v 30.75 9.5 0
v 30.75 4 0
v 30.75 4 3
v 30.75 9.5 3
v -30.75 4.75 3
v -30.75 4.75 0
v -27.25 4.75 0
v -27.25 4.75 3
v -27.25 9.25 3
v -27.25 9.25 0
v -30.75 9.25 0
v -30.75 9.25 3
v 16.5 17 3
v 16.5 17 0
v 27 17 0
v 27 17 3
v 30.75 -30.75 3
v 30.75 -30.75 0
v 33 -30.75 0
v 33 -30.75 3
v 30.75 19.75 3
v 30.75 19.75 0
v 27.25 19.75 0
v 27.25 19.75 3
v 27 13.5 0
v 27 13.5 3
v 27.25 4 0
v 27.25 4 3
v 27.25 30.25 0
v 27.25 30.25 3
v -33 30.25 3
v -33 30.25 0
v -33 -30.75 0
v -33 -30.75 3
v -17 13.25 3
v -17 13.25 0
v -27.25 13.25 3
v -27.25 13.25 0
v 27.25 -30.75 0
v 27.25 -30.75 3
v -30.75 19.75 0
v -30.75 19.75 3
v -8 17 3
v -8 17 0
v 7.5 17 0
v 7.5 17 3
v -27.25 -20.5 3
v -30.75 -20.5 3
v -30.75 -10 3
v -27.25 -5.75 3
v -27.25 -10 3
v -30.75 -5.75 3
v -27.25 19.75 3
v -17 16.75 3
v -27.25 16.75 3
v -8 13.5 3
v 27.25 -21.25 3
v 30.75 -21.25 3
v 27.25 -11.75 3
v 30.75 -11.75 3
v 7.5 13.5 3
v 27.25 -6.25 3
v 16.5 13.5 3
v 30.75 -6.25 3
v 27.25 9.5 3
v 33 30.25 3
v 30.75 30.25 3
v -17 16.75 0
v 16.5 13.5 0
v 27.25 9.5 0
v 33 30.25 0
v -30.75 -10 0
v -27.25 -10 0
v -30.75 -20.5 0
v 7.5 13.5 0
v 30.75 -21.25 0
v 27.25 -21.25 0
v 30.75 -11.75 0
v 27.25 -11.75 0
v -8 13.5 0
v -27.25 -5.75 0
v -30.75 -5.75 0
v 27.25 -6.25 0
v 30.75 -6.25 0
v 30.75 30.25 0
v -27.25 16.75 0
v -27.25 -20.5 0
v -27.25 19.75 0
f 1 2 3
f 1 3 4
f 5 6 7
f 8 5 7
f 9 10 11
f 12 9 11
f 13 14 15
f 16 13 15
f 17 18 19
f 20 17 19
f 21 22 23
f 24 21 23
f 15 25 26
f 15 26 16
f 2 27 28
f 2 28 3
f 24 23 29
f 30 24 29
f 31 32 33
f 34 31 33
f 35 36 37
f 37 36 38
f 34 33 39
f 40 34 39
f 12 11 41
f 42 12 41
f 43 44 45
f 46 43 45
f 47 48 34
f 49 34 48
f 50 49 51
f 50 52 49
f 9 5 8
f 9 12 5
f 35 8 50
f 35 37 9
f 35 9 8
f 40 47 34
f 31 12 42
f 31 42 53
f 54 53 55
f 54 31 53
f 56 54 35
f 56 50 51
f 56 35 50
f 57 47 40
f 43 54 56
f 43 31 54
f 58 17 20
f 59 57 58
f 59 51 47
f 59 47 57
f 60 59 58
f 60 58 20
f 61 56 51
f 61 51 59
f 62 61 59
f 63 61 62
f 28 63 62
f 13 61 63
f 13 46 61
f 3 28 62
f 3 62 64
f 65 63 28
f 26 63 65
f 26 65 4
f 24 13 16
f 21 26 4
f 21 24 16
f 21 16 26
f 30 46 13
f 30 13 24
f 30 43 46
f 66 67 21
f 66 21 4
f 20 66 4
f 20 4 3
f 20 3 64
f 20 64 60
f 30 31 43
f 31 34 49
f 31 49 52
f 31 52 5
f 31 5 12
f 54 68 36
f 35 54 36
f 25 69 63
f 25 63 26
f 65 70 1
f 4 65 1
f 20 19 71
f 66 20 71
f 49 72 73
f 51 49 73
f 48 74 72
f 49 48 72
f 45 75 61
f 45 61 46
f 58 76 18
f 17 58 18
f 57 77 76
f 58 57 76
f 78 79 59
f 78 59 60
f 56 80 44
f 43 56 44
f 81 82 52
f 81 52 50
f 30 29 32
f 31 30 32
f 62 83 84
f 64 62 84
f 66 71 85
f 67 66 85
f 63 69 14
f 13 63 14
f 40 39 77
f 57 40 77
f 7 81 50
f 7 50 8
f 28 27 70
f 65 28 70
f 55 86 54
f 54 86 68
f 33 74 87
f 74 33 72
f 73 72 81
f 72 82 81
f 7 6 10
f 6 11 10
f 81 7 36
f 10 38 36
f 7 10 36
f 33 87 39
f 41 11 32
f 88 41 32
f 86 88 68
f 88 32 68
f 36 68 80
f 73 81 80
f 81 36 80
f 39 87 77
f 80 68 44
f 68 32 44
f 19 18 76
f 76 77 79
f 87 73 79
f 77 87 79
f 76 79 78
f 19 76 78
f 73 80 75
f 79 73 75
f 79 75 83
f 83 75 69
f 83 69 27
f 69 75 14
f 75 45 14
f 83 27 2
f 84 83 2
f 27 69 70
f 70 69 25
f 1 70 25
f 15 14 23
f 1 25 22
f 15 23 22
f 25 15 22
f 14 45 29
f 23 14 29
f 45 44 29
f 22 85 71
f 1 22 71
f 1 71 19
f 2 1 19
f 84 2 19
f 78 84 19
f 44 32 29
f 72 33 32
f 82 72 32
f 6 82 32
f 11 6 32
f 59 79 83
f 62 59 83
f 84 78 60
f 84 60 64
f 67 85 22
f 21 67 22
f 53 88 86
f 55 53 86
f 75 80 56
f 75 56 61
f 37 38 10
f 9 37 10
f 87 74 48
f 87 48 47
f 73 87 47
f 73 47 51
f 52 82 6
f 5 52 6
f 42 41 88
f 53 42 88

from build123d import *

# Parameters (mm, degrees)
SKETCH_1_W      = 15.5
SKETCH_1_H      = 3.5
SKETCH_1_W_2    = 10.5
SKETCH_1_W_3    = 3.5
SKETCH_1_H_2    = 5.5
SKETCH_1_H_3    = 10.5
EXTRUDE_1_DEPTH = 3


with BuildPart() as part:
    # Эскиз1 → Бобышка-Вытянуть1 (new body)
    with BuildSketch(Plane.XY):
        Polygon((30.75, -30.75), (33, -30.75), (33, 30.25), (30.75, 30.25), (30.75, 19.75), (27.25, 19.75), (27.25, 30.25), (-33, 30.25), (-33, -30.75), (27.25, -30.75), (27.25, -21.25), (30.75, -21.25), align=None)
        Polygon((-27.25, 13.25), (-27.25, 9.25), (-30.75, 9.25), (-30.75, 19.75), (-27.25, 19.75), (-27.25, 16.75), (-17, 16.75), (-17, 13.25), align=None, mode=Mode.SUBTRACT)
        with Locations((-0.25, 15.25)):
            Rectangle(SKETCH_1_W, SKETCH_1_H, mode=Mode.SUBTRACT)
        with Locations((21.75, 15.25)):
            Rectangle(SKETCH_1_W_2, SKETCH_1_H, mode=Mode.SUBTRACT)
        with Locations((29, 6.75)):
            Rectangle(SKETCH_1_W_3, SKETCH_1_H_2, mode=Mode.SUBTRACT)
        with Locations((29, -9)):
            Rectangle(SKETCH_1_W_3, SKETCH_1_H_2, mode=Mode.SUBTRACT)
        with Locations((-29, -0.5)):
            Rectangle(SKETCH_1_W_3, SKETCH_1_H_3, mode=Mode.SUBTRACT)
        with Locations((-29, -15.25)):
            Rectangle(SKETCH_1_W_3, SKETCH_1_H_3, mode=Mode.SUBTRACT)
    extrude(amount=EXTRUDE_1_DEPTH)


solid = part.part
